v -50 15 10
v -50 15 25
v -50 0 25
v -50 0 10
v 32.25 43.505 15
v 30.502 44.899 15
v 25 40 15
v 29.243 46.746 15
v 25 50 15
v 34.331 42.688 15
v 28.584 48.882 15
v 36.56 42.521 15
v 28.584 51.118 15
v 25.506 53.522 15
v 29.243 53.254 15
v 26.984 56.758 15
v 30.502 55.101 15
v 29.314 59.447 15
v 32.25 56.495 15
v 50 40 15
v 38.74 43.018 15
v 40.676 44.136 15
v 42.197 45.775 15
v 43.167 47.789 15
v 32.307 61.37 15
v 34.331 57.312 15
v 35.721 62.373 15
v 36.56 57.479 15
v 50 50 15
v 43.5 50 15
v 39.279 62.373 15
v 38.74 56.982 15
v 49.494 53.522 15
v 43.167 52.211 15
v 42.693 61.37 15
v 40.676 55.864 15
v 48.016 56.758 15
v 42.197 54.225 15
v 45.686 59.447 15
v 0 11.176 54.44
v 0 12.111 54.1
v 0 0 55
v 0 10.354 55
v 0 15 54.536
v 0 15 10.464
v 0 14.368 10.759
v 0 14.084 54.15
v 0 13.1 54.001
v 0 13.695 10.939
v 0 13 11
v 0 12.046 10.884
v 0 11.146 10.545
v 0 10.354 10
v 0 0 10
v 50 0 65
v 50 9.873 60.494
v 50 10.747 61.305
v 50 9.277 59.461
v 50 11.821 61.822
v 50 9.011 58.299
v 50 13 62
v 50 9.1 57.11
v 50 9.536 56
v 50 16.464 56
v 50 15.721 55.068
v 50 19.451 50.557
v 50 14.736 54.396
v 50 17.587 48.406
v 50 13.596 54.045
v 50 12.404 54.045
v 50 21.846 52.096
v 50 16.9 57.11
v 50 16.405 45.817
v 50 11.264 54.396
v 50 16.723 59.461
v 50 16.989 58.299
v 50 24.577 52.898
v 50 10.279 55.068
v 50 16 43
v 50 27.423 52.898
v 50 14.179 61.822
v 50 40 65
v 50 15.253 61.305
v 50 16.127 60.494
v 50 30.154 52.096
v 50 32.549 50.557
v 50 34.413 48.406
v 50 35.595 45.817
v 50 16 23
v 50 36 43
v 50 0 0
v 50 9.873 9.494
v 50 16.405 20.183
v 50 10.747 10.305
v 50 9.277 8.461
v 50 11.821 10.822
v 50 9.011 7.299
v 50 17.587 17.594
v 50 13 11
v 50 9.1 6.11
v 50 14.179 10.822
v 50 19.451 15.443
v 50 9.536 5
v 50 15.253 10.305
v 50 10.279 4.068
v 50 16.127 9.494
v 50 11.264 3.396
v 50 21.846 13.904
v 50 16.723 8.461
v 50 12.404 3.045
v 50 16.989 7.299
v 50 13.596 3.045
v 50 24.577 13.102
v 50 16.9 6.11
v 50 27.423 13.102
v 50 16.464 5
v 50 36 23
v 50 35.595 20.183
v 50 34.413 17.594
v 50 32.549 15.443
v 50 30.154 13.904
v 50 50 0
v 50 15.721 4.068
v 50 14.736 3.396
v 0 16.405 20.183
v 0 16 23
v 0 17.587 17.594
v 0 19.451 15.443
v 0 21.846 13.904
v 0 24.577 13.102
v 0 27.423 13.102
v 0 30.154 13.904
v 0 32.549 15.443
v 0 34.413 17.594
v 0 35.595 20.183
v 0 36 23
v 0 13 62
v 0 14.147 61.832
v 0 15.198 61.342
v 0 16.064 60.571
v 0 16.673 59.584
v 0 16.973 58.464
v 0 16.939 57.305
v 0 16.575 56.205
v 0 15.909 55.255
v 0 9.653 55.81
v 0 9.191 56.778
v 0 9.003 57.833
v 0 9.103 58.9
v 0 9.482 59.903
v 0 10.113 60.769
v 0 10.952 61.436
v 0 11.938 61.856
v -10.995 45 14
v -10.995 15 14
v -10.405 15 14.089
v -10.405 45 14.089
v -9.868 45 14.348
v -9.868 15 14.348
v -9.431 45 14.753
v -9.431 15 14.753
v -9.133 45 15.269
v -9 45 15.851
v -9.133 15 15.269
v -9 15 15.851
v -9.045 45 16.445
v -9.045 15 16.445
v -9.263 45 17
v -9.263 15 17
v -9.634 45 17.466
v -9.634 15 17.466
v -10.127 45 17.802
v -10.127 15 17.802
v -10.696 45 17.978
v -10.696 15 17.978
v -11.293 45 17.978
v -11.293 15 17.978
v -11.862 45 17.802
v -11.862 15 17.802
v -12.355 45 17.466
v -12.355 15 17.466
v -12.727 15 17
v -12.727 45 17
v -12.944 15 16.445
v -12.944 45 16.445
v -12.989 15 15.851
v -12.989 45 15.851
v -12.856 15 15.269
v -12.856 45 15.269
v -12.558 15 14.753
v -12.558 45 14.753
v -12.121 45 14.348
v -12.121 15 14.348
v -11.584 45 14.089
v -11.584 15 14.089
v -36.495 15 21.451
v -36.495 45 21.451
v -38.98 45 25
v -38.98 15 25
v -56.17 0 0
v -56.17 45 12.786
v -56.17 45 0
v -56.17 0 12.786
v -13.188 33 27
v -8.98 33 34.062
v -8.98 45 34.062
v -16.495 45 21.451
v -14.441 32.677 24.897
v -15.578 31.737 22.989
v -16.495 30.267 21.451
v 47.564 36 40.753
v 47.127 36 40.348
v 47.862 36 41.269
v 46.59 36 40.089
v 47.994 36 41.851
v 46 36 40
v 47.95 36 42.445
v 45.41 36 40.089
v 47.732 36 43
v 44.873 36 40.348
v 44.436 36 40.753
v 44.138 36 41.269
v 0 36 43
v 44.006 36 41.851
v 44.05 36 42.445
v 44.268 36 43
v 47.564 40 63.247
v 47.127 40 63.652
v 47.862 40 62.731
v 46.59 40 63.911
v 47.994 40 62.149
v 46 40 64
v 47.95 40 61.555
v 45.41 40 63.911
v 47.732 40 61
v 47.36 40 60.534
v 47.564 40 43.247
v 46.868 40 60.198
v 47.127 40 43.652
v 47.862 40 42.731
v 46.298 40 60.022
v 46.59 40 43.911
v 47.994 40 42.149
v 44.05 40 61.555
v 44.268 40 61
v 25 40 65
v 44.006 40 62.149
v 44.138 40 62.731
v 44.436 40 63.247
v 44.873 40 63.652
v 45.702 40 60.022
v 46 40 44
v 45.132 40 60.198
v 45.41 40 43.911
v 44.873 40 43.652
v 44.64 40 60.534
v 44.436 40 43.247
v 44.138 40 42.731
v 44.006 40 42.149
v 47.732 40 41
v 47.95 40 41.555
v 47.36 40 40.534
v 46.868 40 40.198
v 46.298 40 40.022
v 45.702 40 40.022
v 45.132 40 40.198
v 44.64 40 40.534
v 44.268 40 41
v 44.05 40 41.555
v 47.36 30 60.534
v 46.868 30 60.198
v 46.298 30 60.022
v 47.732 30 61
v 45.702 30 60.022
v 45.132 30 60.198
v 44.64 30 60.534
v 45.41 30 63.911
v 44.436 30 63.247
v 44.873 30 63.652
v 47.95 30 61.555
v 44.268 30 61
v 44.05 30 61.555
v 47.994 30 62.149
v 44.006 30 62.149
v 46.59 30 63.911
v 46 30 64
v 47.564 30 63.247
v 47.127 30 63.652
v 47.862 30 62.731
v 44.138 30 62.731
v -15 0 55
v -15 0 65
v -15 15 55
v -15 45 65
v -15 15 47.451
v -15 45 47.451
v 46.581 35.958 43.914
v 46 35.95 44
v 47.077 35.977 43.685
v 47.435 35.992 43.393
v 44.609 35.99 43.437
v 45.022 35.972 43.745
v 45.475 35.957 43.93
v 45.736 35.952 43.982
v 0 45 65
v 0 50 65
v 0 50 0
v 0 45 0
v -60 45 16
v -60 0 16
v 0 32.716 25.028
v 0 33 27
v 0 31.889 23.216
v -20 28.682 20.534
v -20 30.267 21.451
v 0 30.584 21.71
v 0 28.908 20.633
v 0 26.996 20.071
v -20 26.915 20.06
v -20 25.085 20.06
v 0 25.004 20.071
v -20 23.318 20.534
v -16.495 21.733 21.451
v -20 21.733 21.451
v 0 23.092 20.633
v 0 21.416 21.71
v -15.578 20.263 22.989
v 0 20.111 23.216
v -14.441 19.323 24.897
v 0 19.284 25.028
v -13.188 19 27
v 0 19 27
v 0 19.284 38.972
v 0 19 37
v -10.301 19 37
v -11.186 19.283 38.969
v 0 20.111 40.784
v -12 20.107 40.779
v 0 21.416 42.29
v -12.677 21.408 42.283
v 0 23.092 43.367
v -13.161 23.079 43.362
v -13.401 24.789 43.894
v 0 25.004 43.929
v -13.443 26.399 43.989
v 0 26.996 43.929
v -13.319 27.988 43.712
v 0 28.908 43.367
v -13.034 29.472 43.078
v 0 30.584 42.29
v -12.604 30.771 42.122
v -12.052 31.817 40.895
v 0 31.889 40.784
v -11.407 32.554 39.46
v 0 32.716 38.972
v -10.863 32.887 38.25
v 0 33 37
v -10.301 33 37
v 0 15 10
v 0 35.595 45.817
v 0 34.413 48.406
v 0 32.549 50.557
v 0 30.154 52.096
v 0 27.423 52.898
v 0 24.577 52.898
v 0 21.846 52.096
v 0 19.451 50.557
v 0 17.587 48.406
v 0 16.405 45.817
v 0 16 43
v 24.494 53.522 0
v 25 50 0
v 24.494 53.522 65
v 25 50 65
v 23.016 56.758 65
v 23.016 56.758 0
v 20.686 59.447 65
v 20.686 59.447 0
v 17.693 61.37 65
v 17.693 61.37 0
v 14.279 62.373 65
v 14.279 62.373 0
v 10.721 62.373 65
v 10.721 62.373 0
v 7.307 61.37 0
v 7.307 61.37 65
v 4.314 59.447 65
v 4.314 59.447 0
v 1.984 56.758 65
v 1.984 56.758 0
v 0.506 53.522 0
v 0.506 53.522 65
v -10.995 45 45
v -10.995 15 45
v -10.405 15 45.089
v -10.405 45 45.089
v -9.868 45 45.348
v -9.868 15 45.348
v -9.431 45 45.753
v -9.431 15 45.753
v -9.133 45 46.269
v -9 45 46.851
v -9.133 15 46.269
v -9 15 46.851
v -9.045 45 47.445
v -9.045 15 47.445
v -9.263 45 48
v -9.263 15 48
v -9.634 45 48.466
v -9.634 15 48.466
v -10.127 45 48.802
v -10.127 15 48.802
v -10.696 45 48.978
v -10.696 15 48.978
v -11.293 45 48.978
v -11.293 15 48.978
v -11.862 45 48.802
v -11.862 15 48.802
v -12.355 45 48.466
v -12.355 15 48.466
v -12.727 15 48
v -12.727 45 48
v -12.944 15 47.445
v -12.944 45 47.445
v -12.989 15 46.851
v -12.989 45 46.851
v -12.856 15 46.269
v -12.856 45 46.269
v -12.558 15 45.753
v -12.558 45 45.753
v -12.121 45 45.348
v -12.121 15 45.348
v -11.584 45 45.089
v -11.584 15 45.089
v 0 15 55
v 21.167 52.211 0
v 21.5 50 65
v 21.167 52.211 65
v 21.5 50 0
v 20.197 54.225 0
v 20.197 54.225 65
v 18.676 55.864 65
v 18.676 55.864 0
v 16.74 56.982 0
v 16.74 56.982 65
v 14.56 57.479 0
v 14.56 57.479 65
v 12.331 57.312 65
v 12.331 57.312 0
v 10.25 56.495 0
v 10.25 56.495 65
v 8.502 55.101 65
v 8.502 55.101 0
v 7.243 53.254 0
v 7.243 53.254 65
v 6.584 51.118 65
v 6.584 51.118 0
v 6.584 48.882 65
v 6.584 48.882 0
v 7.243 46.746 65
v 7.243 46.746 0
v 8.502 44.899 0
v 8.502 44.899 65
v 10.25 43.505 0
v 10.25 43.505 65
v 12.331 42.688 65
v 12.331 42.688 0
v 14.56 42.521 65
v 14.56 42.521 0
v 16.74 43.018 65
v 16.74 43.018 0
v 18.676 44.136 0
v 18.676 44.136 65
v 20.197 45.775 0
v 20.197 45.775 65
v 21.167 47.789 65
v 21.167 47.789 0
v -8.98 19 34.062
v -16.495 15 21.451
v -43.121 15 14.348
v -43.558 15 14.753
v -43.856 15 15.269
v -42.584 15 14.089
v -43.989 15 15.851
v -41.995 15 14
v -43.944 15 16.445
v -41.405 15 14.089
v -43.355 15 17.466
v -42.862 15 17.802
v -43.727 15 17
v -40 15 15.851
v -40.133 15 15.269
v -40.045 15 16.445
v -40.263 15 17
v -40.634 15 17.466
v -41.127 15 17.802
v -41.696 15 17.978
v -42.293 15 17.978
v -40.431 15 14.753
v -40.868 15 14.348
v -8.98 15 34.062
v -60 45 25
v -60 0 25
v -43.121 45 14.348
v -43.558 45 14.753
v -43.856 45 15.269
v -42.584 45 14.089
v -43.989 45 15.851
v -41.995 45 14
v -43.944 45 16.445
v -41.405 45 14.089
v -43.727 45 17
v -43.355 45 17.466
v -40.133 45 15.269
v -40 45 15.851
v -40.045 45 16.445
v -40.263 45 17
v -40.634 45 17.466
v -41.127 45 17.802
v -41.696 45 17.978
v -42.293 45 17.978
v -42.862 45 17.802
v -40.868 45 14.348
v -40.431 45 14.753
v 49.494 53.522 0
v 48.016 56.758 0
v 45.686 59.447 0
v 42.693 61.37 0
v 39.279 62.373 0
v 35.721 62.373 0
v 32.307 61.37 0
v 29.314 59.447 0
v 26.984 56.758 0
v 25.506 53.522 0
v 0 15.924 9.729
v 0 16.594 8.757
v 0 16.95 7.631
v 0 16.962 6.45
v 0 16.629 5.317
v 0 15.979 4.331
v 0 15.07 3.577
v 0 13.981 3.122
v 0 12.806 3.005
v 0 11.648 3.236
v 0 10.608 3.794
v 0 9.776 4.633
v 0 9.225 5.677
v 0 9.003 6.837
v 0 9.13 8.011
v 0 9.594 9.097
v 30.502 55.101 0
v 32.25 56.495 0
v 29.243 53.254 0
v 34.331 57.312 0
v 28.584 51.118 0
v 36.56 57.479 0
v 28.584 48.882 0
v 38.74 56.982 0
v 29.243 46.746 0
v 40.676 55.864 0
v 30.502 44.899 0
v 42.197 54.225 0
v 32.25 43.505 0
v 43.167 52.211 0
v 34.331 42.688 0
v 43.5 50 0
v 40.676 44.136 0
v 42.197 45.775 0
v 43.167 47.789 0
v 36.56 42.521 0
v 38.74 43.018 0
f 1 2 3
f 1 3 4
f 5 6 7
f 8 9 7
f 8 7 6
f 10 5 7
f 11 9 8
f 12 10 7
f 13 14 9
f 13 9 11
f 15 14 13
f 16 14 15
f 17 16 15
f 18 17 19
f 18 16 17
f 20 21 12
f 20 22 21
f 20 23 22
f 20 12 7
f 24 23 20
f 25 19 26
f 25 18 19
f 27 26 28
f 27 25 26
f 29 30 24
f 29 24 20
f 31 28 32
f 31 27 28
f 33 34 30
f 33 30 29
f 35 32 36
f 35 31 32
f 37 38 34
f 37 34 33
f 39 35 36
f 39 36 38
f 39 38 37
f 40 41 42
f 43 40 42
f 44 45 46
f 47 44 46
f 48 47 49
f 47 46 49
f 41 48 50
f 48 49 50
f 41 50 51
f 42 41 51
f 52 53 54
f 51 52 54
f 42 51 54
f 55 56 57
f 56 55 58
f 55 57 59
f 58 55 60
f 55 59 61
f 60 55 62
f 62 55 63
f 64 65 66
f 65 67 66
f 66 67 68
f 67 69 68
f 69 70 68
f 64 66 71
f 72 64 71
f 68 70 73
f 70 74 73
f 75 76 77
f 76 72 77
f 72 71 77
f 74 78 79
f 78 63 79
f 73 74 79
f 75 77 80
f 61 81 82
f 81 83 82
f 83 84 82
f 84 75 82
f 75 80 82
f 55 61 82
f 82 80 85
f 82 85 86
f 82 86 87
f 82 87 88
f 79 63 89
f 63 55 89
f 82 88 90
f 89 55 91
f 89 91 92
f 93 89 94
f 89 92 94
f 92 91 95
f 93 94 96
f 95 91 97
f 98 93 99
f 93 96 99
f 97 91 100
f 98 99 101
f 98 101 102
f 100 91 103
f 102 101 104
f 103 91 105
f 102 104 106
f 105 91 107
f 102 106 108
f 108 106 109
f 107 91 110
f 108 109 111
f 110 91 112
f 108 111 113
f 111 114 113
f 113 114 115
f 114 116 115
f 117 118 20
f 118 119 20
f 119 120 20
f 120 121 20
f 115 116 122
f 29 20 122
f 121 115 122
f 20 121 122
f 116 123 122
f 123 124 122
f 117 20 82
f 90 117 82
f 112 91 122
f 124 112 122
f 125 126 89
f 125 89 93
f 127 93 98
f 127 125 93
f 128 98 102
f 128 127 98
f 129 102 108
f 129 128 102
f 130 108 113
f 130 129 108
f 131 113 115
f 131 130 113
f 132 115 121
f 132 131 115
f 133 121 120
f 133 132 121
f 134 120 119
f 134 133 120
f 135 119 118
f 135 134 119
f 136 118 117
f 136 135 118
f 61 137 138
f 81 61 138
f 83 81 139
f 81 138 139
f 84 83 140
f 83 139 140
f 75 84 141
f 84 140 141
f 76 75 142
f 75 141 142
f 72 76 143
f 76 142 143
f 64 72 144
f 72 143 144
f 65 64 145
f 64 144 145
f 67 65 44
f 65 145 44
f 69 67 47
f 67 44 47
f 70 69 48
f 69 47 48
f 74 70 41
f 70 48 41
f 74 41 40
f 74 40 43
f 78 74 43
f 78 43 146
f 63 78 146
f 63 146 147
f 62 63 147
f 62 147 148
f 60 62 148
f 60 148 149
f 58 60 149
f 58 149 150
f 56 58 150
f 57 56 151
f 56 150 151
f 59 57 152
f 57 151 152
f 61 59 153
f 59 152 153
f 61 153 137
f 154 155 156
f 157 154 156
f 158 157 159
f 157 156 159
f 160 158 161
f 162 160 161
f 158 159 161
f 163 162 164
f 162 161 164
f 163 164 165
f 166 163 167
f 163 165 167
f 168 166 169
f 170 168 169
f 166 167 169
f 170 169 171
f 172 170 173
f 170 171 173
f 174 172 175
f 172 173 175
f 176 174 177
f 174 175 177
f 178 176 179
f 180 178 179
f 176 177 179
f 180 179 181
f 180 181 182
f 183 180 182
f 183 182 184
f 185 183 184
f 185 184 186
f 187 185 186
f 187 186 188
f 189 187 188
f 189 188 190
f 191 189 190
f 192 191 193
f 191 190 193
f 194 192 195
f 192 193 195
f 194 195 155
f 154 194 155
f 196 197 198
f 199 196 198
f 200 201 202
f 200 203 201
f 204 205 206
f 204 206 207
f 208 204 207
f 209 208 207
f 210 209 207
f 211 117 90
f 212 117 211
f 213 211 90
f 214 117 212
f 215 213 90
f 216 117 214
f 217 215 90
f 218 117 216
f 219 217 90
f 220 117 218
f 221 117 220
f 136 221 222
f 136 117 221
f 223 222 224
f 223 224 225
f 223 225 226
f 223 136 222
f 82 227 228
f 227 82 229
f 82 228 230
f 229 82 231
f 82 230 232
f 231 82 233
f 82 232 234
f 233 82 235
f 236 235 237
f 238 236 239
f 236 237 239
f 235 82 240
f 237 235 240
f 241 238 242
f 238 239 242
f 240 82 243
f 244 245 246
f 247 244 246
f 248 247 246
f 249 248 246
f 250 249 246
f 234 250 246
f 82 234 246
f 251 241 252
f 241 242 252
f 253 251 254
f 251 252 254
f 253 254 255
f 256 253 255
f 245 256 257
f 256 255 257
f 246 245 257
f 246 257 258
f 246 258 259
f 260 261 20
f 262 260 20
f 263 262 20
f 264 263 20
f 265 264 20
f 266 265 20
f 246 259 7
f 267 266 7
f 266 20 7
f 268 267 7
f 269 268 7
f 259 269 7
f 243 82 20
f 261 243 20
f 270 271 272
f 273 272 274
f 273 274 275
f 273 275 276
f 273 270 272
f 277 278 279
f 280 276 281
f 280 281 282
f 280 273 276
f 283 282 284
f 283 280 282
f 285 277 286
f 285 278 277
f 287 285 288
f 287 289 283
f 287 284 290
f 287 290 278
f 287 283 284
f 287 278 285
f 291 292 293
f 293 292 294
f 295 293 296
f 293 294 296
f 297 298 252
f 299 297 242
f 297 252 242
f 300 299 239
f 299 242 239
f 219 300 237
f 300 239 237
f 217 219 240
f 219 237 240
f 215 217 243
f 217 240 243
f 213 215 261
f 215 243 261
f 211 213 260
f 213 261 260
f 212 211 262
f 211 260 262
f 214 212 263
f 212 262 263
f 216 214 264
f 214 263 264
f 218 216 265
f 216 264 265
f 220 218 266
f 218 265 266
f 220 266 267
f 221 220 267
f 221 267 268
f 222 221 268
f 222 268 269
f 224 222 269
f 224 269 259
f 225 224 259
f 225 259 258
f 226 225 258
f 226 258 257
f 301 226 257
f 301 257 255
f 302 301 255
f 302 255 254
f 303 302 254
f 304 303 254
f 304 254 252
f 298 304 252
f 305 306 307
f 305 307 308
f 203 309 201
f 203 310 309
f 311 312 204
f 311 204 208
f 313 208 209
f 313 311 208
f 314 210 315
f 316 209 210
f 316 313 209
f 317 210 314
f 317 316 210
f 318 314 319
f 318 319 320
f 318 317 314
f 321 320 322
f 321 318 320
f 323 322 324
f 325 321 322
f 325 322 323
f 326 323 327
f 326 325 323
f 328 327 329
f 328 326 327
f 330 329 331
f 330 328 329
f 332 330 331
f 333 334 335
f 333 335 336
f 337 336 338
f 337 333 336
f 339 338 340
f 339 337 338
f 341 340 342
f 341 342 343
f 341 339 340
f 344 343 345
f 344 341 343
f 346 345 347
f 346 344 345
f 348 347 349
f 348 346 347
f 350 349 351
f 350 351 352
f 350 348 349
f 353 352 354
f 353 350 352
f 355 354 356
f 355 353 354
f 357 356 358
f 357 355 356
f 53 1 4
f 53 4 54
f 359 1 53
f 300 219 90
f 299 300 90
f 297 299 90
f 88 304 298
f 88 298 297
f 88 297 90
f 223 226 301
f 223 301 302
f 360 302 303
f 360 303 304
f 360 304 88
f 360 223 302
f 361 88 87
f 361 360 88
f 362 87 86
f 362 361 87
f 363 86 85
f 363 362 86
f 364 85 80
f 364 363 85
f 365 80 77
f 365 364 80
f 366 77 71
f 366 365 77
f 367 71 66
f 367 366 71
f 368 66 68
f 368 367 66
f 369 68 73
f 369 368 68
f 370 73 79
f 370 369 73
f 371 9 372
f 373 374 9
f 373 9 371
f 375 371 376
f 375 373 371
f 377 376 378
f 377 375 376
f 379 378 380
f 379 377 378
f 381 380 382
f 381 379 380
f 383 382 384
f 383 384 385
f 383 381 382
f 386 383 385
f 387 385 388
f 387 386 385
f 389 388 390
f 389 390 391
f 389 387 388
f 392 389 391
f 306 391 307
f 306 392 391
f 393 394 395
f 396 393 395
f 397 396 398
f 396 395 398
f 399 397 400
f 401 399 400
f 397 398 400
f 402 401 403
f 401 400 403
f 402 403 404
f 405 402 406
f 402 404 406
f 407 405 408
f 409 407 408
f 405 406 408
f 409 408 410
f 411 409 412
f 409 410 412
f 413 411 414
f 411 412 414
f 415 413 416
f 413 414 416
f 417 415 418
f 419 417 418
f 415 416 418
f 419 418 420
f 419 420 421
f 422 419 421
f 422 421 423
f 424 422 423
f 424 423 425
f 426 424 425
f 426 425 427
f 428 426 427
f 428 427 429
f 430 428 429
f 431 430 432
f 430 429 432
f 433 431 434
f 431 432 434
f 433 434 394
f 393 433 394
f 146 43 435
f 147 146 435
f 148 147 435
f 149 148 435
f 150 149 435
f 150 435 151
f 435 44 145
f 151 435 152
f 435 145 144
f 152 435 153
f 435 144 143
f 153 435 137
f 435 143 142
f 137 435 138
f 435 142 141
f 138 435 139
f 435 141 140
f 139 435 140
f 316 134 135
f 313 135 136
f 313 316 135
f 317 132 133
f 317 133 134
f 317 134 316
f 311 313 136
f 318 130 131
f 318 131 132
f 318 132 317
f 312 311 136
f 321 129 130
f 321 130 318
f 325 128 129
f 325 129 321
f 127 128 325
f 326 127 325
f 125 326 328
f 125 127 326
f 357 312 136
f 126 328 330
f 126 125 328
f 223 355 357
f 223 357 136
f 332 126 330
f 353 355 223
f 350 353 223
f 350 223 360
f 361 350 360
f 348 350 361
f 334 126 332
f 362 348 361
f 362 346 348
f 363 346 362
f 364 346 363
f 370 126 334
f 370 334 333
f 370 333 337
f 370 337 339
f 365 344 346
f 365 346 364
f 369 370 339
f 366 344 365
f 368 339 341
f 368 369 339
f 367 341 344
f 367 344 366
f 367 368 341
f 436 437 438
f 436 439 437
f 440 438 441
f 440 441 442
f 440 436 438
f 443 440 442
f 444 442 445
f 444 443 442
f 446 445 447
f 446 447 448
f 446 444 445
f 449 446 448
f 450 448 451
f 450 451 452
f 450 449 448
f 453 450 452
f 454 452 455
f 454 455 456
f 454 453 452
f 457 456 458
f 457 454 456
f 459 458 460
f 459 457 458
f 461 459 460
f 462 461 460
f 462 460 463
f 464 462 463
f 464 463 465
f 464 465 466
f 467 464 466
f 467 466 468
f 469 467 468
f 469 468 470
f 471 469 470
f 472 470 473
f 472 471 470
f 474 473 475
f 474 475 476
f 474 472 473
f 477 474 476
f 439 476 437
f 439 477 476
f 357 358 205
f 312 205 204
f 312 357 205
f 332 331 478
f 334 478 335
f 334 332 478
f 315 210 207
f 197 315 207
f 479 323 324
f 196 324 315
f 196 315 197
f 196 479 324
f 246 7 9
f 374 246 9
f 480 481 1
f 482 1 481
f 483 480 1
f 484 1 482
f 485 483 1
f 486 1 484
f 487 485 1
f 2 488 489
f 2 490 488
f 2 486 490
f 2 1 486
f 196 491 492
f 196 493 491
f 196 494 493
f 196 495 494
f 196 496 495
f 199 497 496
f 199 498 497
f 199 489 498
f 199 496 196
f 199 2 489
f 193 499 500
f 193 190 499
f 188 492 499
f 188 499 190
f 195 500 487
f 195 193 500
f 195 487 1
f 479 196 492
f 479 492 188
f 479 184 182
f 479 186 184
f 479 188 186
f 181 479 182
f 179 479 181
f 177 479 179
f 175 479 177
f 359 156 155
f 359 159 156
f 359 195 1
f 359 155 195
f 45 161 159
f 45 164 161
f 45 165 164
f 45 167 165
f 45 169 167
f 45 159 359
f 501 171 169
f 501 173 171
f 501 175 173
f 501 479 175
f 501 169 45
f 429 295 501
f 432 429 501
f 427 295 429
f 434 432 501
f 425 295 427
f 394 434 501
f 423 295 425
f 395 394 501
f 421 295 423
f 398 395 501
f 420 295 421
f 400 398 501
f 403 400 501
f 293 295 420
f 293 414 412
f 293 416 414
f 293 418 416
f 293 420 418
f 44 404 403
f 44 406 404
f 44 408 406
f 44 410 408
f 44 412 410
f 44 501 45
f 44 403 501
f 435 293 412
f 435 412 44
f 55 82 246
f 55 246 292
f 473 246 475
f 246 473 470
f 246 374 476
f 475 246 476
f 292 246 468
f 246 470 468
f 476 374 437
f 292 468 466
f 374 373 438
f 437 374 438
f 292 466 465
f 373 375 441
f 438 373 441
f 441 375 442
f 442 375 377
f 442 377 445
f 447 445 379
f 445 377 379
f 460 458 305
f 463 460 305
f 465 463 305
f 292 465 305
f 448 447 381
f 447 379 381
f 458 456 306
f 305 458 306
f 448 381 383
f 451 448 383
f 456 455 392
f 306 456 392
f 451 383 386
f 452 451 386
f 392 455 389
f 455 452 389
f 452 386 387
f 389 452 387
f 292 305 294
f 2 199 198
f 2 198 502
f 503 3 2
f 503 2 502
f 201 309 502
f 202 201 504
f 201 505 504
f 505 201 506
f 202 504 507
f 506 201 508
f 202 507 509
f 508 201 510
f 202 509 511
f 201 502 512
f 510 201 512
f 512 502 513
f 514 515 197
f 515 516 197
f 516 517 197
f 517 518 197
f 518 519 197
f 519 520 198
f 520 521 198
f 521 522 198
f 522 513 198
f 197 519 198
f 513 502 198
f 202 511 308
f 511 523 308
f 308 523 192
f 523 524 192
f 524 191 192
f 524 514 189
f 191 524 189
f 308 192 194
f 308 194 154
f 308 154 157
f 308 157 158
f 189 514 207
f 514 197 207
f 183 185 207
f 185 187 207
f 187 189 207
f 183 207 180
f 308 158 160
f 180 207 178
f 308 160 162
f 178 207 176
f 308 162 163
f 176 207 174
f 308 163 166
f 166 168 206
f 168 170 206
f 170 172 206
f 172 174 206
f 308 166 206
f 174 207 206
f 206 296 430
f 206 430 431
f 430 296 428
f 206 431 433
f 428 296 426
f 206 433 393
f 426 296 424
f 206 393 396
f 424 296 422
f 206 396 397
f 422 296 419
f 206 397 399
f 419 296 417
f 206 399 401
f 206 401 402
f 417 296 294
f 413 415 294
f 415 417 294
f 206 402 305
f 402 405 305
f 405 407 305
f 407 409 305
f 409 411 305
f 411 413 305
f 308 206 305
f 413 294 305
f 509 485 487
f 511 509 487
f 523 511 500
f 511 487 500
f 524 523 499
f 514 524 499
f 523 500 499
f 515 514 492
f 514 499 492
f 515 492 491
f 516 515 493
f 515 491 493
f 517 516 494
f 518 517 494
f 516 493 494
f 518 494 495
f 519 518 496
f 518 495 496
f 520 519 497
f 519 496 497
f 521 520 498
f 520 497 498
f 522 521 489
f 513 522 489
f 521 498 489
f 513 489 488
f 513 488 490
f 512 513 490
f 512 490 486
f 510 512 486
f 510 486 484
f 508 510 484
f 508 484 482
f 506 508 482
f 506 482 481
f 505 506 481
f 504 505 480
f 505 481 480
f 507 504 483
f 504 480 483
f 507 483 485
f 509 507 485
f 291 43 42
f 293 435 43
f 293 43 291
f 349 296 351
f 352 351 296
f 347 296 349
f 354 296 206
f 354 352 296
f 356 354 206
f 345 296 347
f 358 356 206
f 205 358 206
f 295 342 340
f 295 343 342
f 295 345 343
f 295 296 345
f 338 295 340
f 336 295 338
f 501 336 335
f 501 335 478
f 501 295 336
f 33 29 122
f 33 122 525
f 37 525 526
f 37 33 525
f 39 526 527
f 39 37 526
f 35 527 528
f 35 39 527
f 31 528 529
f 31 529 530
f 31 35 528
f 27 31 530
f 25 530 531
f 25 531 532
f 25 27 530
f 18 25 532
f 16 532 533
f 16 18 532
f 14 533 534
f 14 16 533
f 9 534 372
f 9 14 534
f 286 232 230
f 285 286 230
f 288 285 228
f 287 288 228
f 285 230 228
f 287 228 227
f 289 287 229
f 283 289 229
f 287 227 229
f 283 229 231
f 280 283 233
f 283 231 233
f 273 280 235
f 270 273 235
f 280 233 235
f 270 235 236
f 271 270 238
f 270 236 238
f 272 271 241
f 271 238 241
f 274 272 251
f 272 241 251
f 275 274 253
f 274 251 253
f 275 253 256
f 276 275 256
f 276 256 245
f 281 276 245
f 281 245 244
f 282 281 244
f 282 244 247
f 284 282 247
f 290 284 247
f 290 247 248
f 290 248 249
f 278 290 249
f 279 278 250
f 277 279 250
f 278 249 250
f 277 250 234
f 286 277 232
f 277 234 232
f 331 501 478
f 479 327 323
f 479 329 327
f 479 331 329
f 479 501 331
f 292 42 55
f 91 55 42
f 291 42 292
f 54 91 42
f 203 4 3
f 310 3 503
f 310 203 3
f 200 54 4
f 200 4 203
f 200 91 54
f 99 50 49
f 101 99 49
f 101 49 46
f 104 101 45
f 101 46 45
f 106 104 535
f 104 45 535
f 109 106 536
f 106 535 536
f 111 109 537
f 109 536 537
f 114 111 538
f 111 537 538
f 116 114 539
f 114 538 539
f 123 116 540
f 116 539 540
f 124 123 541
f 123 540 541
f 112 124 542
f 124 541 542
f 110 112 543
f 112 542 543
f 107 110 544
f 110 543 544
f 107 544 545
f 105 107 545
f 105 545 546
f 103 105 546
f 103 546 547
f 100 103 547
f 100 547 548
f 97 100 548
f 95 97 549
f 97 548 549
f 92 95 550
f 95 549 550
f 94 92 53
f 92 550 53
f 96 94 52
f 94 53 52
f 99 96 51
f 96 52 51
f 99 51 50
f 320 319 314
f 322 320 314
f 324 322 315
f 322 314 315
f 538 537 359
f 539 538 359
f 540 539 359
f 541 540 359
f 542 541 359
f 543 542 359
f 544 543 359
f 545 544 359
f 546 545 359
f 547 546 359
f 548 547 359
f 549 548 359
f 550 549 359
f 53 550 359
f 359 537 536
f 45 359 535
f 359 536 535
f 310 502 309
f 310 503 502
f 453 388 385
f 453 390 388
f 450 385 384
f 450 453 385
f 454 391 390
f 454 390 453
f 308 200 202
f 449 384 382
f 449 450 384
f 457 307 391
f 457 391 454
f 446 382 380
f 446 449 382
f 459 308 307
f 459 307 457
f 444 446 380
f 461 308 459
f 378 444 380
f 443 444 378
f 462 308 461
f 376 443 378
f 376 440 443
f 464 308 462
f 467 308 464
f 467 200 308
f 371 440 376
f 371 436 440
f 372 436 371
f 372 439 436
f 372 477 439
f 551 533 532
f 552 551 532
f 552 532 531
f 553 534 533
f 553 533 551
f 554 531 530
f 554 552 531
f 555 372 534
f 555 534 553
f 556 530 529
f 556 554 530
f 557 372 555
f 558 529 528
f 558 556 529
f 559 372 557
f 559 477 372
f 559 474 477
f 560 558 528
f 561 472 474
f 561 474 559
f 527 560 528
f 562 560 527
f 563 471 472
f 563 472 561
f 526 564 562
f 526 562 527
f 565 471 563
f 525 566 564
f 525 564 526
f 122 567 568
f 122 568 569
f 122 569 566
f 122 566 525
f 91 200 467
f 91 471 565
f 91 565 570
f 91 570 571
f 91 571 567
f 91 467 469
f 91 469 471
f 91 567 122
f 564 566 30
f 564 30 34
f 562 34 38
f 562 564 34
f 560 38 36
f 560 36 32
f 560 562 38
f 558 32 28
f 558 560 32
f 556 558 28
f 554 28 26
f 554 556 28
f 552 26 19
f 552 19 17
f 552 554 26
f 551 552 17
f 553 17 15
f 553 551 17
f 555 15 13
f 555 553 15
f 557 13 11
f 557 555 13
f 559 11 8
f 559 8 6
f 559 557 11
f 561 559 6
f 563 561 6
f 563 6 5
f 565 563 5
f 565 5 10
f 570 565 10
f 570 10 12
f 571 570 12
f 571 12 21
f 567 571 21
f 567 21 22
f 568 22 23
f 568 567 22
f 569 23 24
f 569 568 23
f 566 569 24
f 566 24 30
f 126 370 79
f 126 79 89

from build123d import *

# Parameters (mm, degrees)
SKETCH1_R               = 7.5
BOSS_EXTRUDE1_DEPTH     = 15
SKETCH2_R               = 7.5
BOSS_EXTRUDE2_DEPTH     = 50
SKETCH3_W               = 50
SKETCH3_H               = 40
BOSS_EXTRUDE3_DEPTH     = 65
CUT_EXTRUDE1_DEPTH      = 105.024035684
CUT_EXTRUDE2_DEPTH      = 96.372952141
BOSS_EXTRUDE7_START     = -15
SKETCH6_R               = 2
BOSS_EXTRUDE7_DEPTH     = 30
SKETCH8_W               = 15
SKETCH8_H               = 10
BOSS_EXTRUDE10_DEPTH    = 15
SKETCH9_R               = 4
CUT_EXTRUDE3_DEPTH      = 109.310895112
CUT_EXTRUDE6_DEPTH      = 20
ESQUISSE1_R             = 2
ENL_V_MAT_EXTRU_1_DEPTH = 10


with BuildPart() as part:
    # Sketch1 → Boss-Extrude1 (new body)
    with BuildSketch(Plane.XY):
        with BuildLine():
            Line((0, 0), (50, 0))
            Line((50, 0), (50, 50))
            ThreePointArc((50, 50), (40.582575695, 63.228756555), (25, 58.660254038))
            ThreePointArc((25, 58.660254038), (9.417424305, 63.228756555), (0, 50))
            Line((0, 50), (0, 0))
        make_face()
        with Locations((36, 50)):
            Circle(SKETCH1_R, mode=Mode.SUBTRACT)
        with Locations((14, 50)):
            Circle(SKETCH1_R, mode=Mode.SUBTRACT)
    extrude(amount=BOSS_EXTRUDE1_DEPTH)

    # Sketch2 → Boss-Extrude2 (add)
    with BuildSketch(Plane.XY.offset(15)):
        with BuildLine():
            Line((0, 50), (0, 0))
            Line((0, 0), (25, 0))
            Line((25, 0), (25, 50))
            ThreePointArc((25, 50), (12.5, 62.5), (0, 50))
        make_face()
        with Locations((14, 50)):
            Circle(SKETCH2_R, mode=Mode.SUBTRACT)
    extrude(amount=BOSS_EXTRUDE2_DEPTH)

    # Sketch3 → Boss-Extrude3 (add)
    with BuildSketch(Plane(origin=(0, 0, 0), x_dir=(-1, 0, 0), z_dir=(0, 0, -1))):
        with Locations((-25, 20)):
            Rectangle(SKETCH3_W, SKETCH3_H)
    extrude(amount=-BOSS_EXTRUDE3_DEPTH)

    # Sketch4 → Cut-Extrude1 (cut, through all)
    with BuildSketch(Plane.ZY):
        with BuildLine():
            Line((23, 36), (43, 36))
            ThreePointArc((43, 36), (53, 26), (43, 16))
            Line((43, 16), (23, 16))
            ThreePointArc((23, 16), (13, 26), (23, 36))
        make_face()
    extrude(amount=-CUT_EXTRUDE1_DEPTH, mode=Mode.SUBTRACT)

    # Sketch2<3> → Cut-Extrude2 (cut, through all)
    with BuildSketch(Plane.XY.offset(15)):
        with BuildLine():
            ThreePointArc((25, 58.660254038), (9.417424305, 63.228756555), (0, 50))
            ThreePointArc((0, 50), (12.5, 62.5), (25, 50))
            ThreePointArc((25, 50), (37.5, 62.5), (50, 50))
            ThreePointArc((50, 50), (40.582575695, 63.228756555), (25, 58.660254038))
        make_face()
    extrude(amount=-CUT_EXTRUDE2_DEPTH, mode=Mode.SUBTRACT)

    # Sketch6 → Boss-Extrude7 (add)
    with BuildSketch(Plane.XZ.offset(BOSS_EXTRUDE7_START)):
        Polygon((0, 65), (-15, 65), (-15, 47.450556951), (-8.979909906, 34.061546791), (-16.494563126, 21.450556951), (-36.494563126, 21.450556951), (-38.979909906, 25), (-60, 25), (-60, 16), (-56.169777784, 12.786061952), (-56.169777784, 0), (0, 0), align=None)
        with Locations((-41.994563126, 16)):
            Circle(SKETCH6_R, mode=Mode.SUBTRACT)
        with Locations((-10.994563126, 16)):
            Circle(SKETCH6_R, mode=Mode.SUBTRACT)
        with Locations((-10.994563126, 47)):
            Circle(SKETCH6_R, mode=Mode.SUBTRACT)
    extrude(amount=-BOSS_EXTRUDE7_DEPTH)

    # Sketch8 → Boss-Extrude10 (add)
    with BuildSketch(Plane(origin=(0, 15, 0), x_dir=(-1, 0, 0), z_dir=(0, -1, 0))):
        Polygon((50, -25), (60, -25), (60, -16), (56.169777784, -12.786061952), (56.169777784, 0), (0, 0), (0, -10), (50, -10), align=None)
        with Locations((7.5, -60)):
            Rectangle(SKETCH8_W, SKETCH8_H)
    extrude(amount=BOSS_EXTRUDE10_DEPTH)

    # Sketch9 → Cut-Extrude3 (cut, through all)
    with BuildSketch(Plane.ZY):
        with Locations((58, 13)):
            Circle(SKETCH9_R)
        with Locations((7, 13)):
            Circle(SKETCH9_R)
    extrude(amount=-CUT_EXTRUDE3_DEPTH, mode=Mode.SUBTRACT)

    # Sketch10 → Cut-Extrude6 (cut)
    with BuildSketch(Plane(origin=(0, 0, 0), x_dir=(0, 0, -1), z_dir=(1, 0, 0))):
        with BuildLine():
            Line((-37, 33), (-27, 33))
            ThreePointArc((-27, 33), (-20, 26), (-27, 19))
            Line((-27, 19), (-37, 19))
            ThreePointArc((-37, 19), (-44, 26), (-37, 33))
        make_face()
    extrude(amount=-CUT_EXTRUDE6_DEPTH, mode=Mode.SUBTRACT)

    # Esquisse1 → Enlèv. mat.-Extru.1 (cut)
    with BuildSketch(Plane(origin=(0, 40, 0), x_dir=(1, 0, 0), z_dir=(0, 1, 0))):
        with Locations((46, -42)):
            Circle(ESQUISSE1_R)
        with Locations((46, -62)):
            Circle(ESQUISSE1_R)
    extrude(amount=-ENL_V_MAT_EXTRU_1_DEPTH, mode=Mode.SUBTRACT)


solid = part.part
